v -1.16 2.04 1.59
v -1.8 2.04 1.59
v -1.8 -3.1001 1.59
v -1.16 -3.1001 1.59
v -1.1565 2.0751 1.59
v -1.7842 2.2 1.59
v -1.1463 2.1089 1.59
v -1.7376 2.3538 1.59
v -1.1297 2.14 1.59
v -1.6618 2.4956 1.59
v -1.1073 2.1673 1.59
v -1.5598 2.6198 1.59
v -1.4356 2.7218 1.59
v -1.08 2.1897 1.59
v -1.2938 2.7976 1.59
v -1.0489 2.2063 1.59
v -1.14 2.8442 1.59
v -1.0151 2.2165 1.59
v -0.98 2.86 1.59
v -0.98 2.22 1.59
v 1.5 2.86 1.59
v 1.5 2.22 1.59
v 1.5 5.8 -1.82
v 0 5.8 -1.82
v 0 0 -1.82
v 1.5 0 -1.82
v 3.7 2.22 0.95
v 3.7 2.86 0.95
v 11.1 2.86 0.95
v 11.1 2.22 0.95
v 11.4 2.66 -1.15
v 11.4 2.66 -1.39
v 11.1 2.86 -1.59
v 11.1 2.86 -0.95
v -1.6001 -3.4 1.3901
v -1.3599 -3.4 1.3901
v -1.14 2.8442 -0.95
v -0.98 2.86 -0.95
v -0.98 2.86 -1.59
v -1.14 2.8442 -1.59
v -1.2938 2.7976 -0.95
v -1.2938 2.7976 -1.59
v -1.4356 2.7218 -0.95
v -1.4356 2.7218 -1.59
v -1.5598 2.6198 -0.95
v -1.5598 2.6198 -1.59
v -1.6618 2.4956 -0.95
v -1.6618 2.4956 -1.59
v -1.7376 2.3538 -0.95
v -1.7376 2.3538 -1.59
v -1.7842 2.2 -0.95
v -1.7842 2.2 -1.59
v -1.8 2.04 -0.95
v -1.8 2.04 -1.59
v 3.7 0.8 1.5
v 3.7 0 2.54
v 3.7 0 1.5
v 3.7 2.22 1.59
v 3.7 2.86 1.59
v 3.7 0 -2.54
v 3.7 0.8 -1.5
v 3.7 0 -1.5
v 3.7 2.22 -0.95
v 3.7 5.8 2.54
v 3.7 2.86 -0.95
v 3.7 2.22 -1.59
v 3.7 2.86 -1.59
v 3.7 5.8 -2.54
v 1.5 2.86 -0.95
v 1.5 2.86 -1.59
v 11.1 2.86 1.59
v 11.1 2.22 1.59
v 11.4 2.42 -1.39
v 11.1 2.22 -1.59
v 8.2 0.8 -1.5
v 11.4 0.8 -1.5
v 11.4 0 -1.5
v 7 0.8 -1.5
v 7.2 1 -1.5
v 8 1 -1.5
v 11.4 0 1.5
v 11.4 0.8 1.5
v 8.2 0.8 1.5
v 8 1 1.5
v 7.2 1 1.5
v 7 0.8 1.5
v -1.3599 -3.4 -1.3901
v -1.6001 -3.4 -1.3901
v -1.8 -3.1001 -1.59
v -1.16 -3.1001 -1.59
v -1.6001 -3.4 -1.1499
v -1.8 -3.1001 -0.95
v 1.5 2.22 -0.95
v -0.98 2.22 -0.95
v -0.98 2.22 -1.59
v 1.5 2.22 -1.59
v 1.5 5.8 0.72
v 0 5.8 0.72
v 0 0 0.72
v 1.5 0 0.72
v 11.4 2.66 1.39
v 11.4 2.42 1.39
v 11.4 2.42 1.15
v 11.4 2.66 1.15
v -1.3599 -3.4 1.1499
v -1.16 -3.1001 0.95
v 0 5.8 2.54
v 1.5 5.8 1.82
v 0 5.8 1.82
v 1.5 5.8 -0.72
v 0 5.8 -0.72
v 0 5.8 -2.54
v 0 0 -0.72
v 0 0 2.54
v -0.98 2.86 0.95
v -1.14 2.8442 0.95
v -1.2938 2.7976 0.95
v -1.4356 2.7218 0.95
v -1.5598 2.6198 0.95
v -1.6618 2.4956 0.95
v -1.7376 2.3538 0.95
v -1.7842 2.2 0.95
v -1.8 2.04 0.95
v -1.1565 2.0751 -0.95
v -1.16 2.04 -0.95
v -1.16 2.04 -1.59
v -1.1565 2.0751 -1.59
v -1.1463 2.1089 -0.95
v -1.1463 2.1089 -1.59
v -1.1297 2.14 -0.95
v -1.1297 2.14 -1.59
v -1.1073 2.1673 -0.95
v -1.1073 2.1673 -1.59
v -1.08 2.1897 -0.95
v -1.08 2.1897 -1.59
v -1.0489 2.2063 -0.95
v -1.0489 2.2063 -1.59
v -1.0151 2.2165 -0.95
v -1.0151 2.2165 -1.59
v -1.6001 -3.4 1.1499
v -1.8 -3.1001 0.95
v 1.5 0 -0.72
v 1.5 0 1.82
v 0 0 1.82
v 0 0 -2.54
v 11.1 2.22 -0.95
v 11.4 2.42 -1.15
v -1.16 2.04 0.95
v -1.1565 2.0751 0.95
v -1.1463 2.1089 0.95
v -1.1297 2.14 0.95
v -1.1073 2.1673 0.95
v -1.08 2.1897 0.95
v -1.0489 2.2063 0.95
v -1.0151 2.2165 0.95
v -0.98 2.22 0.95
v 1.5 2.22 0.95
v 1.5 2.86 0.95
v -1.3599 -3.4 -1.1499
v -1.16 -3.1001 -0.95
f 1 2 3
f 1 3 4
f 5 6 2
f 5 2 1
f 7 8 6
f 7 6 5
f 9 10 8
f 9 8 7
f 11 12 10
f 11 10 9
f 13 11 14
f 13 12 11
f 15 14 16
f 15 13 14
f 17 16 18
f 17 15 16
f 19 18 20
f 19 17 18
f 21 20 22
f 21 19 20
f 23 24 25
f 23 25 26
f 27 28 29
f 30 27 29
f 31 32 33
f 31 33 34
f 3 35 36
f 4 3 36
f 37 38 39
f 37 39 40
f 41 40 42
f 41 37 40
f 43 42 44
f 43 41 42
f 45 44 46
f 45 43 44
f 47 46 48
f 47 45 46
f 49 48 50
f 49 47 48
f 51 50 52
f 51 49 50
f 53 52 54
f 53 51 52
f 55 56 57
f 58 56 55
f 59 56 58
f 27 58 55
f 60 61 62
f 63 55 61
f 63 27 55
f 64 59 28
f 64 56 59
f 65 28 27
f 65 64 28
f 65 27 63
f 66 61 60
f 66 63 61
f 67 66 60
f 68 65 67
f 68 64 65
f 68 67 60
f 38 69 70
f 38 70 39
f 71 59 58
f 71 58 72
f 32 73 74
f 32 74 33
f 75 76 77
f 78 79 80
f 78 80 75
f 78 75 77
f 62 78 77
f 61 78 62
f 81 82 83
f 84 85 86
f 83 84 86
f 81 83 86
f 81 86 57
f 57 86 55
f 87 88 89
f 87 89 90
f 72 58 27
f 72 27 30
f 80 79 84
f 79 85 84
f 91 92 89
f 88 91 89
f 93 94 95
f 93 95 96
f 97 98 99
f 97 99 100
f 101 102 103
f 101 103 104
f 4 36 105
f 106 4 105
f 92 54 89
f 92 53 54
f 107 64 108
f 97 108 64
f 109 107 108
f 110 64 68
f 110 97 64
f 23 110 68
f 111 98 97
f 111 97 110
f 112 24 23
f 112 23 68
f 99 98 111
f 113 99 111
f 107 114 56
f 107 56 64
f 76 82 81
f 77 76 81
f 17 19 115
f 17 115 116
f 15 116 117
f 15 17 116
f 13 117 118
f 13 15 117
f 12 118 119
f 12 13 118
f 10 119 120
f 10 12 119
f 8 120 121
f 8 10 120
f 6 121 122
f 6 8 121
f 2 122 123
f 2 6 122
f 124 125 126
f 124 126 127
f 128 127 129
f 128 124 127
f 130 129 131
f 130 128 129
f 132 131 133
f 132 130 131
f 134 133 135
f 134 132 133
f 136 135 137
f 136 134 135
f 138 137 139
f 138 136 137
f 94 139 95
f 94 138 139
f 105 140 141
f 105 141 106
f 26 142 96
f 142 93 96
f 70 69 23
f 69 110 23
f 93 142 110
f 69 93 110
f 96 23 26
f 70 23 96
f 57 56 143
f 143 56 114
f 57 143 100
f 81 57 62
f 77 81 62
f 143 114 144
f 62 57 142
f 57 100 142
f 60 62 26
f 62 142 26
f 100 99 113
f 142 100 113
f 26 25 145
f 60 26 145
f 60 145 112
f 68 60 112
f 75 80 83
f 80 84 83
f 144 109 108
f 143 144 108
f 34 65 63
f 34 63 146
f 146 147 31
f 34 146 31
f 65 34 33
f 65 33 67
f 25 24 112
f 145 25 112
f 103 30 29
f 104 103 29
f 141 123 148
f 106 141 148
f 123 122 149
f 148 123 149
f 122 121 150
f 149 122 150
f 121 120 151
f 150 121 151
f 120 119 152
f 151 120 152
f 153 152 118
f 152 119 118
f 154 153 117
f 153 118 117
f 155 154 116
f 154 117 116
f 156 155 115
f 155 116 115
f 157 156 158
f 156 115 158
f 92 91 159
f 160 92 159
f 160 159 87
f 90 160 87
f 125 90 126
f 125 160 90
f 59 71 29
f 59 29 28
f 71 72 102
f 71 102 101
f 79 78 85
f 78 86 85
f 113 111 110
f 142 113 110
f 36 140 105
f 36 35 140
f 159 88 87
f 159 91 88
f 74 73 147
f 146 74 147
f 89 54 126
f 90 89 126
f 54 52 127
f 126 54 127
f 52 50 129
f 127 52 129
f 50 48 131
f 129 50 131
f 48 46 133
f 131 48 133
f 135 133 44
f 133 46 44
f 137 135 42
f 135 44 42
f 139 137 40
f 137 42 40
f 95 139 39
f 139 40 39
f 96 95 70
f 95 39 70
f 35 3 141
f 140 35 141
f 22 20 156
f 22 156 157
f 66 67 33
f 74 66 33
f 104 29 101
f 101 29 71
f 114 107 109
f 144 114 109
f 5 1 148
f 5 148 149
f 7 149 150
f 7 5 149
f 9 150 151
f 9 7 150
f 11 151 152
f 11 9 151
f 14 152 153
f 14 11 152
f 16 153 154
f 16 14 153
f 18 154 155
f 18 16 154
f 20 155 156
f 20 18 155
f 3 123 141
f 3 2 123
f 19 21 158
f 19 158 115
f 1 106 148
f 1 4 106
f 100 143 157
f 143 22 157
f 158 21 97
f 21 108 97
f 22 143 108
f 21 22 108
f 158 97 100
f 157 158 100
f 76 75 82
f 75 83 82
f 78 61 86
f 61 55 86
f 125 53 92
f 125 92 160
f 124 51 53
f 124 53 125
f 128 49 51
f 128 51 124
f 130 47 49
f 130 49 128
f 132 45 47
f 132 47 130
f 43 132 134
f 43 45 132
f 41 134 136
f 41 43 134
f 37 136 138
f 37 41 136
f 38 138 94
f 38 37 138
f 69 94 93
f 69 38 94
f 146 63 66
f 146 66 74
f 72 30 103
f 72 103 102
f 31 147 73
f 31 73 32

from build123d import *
from OCP.BRepFilletAPI import BRepFilletAPI_MakeChamfer

# Parameters (mm, degrees)
SKETCH_1_W                           = 5.08
SKETCH_1_H                           = 5.8
EXTRUDE_1_DEPTH                      = 3.7
CUT_EXTRUDE_1_REACH                  = 9.334
SKETCH_5_W                           = 1.5
SKETCH_5_H                           = 1.1
EXTRUDE_START                        = 1.27
EXTRUDE_1_2_DEPTH                    = 0.32
CHAMFER_1_SIZE                       = 0.2
CHAMFER_1_SIZE2                      = 0.3
CHAMFER_2_SIZE                       = 0.3
CHAMFER_2_SIZE_2                     = 0.2
EXTRUDE_2_DEPTH                      = 1.5
PATTERN_LINEAR_2_COUNT               = 2
PATTERN_LINEAR_2_PITCH               = 2.54
CHAMFER_1_OF_PATTERN_LINEAR_2_SIZE2  = 0.2
CHAMFER_1_OF_PATTERN_LINEAR_2_SIZE   = 0.3
CHAMFER_2_OF_PATTERN_LINEAR_2_SIZE   = 0.3
CHAMFER_2_OF_PATTERN_LINEAR_2_SIZE_2 = 0.2


with BuildPart() as part:
    # Эскиз1 → Extrude 1 (new body)
    with BuildSketch(Plane(origin=(0, 0, 0), x_dir=(0, 0, -1), z_dir=(1, 0, 0))):
        with Locations((0, 2.9)):
            Rectangle(SKETCH_1_W, SKETCH_1_H)
    extrude(amount=EXTRUDE_1_DEPTH)

    # Эскиз5 → Вырез-Вытянуть1 (cut, up to next)
    with BuildSketch(Plane(origin=(0, 5.8, 0), x_dir=(1, 0, 0), z_dir=(0, 1, 0)), mode=Mode.PRIVATE) as cut_extrude_1_sk1:
        with Locations((0.75, -1.27)):
            Rectangle(SKETCH_5_W, SKETCH_5_H)
    cut_extrude_1_tool1 = extrude(cut_extrude_1_sk1.sketch, amount=-CUT_EXTRUDE_1_REACH, mode=Mode.PRIVATE) & part.part
    cut_extrude_1 = cut_extrude_1_tool1.solids().sort_by_distance((0.75, 5.8, 1.27))[0]
    add(cut_extrude_1, mode=Mode.SUBTRACT)

    # Эскиз3 → Extrude 1 2 (add, symmetric)
    with BuildSketch(Plane.XY.offset(EXTRUDE_START)):
        with BuildLine():
            Line((-1.16, -3.4), (-1.16, 2.04))
            ThreePointArc((-1.16, 2.04), (-1.107279221, 2.167279221), (-0.98, 2.22))
            Line((-0.98, 2.22), (11.4, 2.22))
            Line((11.4, 2.22), (11.4, 2.86))
            Line((11.4, 2.86), (-0.98, 2.86))
            ThreePointArc((-0.98, 2.86), (-1.559827561, 2.619827561), (-1.8, 2.04))
            Line((-1.8, 2.04), (-1.8, -3.4))
            Line((-1.8, -3.4), (-1.16, -3.4))
        make_face()
    extrude_1_2 = extrude(amount=EXTRUDE_1_2_DEPTH, both=True)

    # Фаска1
    chamfer_1_edges = [part.edges().sort_by_distance(p)[0] for p in [
        (11.4, 2.54, 1.59),
        (11.4, 2.22, 1.27),
        (11.4, 2.86, 1.27),
        (11.4, 2.54, 0.95),
    ]]
    chamfer_1_side = [part.faces().sort_by_distance(p)[0] for p in [
        (11.4, 2.54, 1.27),
    ]]
    chamfer(chamfer_1_edges, length=CHAMFER_1_SIZE, length2=CHAMFER_1_SIZE2, reference=chamfer_1_side[0])

    # Фаска2
    chamfer_2_edges_1 = [part.edges().sort_by_distance(p)[0] for p in [
        (-1.48, -3.4, 0.95),
    ]]
    chamfer_2_side_1 = [part.faces().sort_by_distance(p)[0] for p in [
        (-1.48, -3.396, 0.95),
    ]]
    chamfer_2_edges_2 = [part.edges().sort_by_distance(p)[0] for p in [
        (-1.48, -3.4, 1.59),
    ]]
    chamfer_2_side_2 = [part.faces().sort_by_distance(p)[0] for p in [
        (-1.48, -3.396, 1.59),
    ]]
    chamfer_2_edges_3 = [part.edges().sort_by_distance(p)[0] for p in [
        (-1.8, -3.4, 1.27),
    ]]
    chamfer_2_side_3 = [part.faces().sort_by_distance(p)[0] for p in [
        (-1.796, -3.4, 1.27),
    ]]
    chamfer_2_edges_4 = [part.edges().sort_by_distance(p)[0] for p in [
        (-1.16, -3.4, 1.27),
    ]]
    chamfer_2_side_4 = [part.faces().sort_by_distance(p)[0] for p in [
        (-1.16, -3.396, 1.27),
    ]]
    chamfer_2 = BRepFilletAPI_MakeChamfer(part.part.solid().wrapped)
    for e in chamfer_2_edges_1:
        chamfer_2.Add(CHAMFER_2_SIZE - 0.0001, CHAMFER_2_SIZE_2 - 0.0001, e.wrapped, chamfer_2_side_1[0].wrapped)
    for e in chamfer_2_edges_2:
        chamfer_2.Add(CHAMFER_2_SIZE - 0.0001, CHAMFER_2_SIZE_2 - 0.0001, e.wrapped, chamfer_2_side_2[0].wrapped)
    for e in chamfer_2_edges_3:
        chamfer_2.Add(CHAMFER_2_SIZE_2 - 0.0001, CHAMFER_2_SIZE - 0.0001, e.wrapped, chamfer_2_side_3[0].wrapped)
    for e in chamfer_2_edges_4:
        chamfer_2.Add(CHAMFER_2_SIZE - 0.0001, CHAMFER_2_SIZE_2 - 0.0001, e.wrapped, chamfer_2_side_4[0].wrapped)
    add(Compound.cast(chamfer_2.Shape()), mode=Mode.REPLACE)  # a hair under: the kernel refuses the full size

    # Эскиз4 → Бобышка-Вытянуть2 (add, symmetric)
    with BuildSketch(Plane.XY):
        Polygon((3.7, 0), (3.7, 0.8), (7, 0.8), (7.2, 1), (8, 1), (8.2, 0.8), (11.4, 0.8), (11.4, 0), align=None)
    extrude(amount=EXTRUDE_2_DEPTH, both=True)

    # Линейный массив2: Вырез-Вытянуть1, Extrude 1 2 ×2
    with Locations(*[(0, 0, -i * PATTERN_LINEAR_2_PITCH) for i in range(1, PATTERN_LINEAR_2_COUNT)]):
        add(cut_extrude_1, mode=Mode.SUBTRACT)
        add(extrude_1_2)

    # Фаска1 of Линейный массив2
    chamfer_1_of_pattern_linear_2_edges = [part.edges().sort_by_distance(p)[0] for p in [
        (11.4, 2.54, -0.95),
        (11.4, 2.22, -1.27),
        (11.4, 2.86, -1.27),
        (11.4, 2.54, -1.59),
    ]]
    chamfer(chamfer_1_of_pattern_linear_2_edges, length=CHAMFER_1_OF_PATTERN_LINEAR_2_SIZE, length2=CHAMFER_1_OF_PATTERN_LINEAR_2_SIZE2)

    # Фаска2 of Линейный массив2
    chamfer_2_of_pattern_linear_2_edges_1 = [part.edges().sort_by_distance(p)[0] for p in [
        (-1.48, -3.4, -1.59),
    ]]
    chamfer_2_of_pattern_linear_2_side_1 = [part.faces().sort_by_distance(p)[0] for p in [
        (-1.48, -3.396, -1.59),
    ]]
    chamfer_2_of_pattern_linear_2_edges_2 = [part.edges().sort_by_distance(p)[0] for p in [
        (-1.48, -3.4, -0.95),
    ]]
    chamfer_2_of_pattern_linear_2_side_2 = [part.faces().sort_by_distance(p)[0] for p in [
        (-1.48, -3.396, -0.95),
    ]]
    chamfer_2_of_pattern_linear_2_edges_3 = [part.edges().sort_by_distance(p)[0] for p in [
        (-1.8, -3.4, -1.27),
    ]]
    chamfer_2_of_pattern_linear_2_side_3 = [part.faces().sort_by_distance(p)[0] for p in [
        (-1.796, -3.4, -1.27),
    ]]
    chamfer_2_of_pattern_linear_2_edges_4 = [part.edges().sort_by_distance(p)[0] for p in [
        (-1.16, -3.4, -1.27),
    ]]
    chamfer_2_of_pattern_linear_2_side_4 = [part.faces().sort_by_distance(p)[0] for p in [
        (-1.16, -3.396, -1.27),
    ]]
    chamfer_2_of_pattern_linear_2 = BRepFilletAPI_MakeChamfer(part.part.solid().wrapped)
    for e in chamfer_2_of_pattern_linear_2_edges_1:
        chamfer_2_of_pattern_linear_2.Add(CHAMFER_2_OF_PATTERN_LINEAR_2_SIZE - 0.0001, CHAMFER_2_OF_PATTERN_LINEAR_2_SIZE_2 - 0.0001, e.wrapped, chamfer_2_of_pattern_linear_2_side_1[0].wrapped)
    for e in chamfer_2_of_pattern_linear_2_edges_2:
        chamfer_2_of_pattern_linear_2.Add(CHAMFER_2_OF_PATTERN_LINEAR_2_SIZE - 0.0001, CHAMFER_2_OF_PATTERN_LINEAR_2_SIZE_2 - 0.0001, e.wrapped, chamfer_2_of_pattern_linear_2_side_2[0].wrapped)
    for e in chamfer_2_of_pattern_linear_2_edges_3:
        chamfer_2_of_pattern_linear_2.Add(CHAMFER_2_OF_PATTERN_LINEAR_2_SIZE_2 - 0.0001, CHAMFER_2_OF_PATTERN_LINEAR_2_SIZE - 0.0001, e.wrapped, chamfer_2_of_pattern_linear_2_side_3[0].wrapped)
    for e in chamfer_2_of_pattern_linear_2_edges_4:
        chamfer_2_of_pattern_linear_2.Add(CHAMFER_2_OF_PATTERN_LINEAR_2_SIZE - 0.0001, CHAMFER_2_OF_PATTERN_LINEAR_2_SIZE_2 - 0.0001, e.wrapped, chamfer_2_of_pattern_linear_2_side_4[0].wrapped)
    add(Compound.cast(chamfer_2_of_pattern_linear_2.Shape()), mode=Mode.REPLACE)  # a hair under: the kernel refuses the full size


solid = part.part
